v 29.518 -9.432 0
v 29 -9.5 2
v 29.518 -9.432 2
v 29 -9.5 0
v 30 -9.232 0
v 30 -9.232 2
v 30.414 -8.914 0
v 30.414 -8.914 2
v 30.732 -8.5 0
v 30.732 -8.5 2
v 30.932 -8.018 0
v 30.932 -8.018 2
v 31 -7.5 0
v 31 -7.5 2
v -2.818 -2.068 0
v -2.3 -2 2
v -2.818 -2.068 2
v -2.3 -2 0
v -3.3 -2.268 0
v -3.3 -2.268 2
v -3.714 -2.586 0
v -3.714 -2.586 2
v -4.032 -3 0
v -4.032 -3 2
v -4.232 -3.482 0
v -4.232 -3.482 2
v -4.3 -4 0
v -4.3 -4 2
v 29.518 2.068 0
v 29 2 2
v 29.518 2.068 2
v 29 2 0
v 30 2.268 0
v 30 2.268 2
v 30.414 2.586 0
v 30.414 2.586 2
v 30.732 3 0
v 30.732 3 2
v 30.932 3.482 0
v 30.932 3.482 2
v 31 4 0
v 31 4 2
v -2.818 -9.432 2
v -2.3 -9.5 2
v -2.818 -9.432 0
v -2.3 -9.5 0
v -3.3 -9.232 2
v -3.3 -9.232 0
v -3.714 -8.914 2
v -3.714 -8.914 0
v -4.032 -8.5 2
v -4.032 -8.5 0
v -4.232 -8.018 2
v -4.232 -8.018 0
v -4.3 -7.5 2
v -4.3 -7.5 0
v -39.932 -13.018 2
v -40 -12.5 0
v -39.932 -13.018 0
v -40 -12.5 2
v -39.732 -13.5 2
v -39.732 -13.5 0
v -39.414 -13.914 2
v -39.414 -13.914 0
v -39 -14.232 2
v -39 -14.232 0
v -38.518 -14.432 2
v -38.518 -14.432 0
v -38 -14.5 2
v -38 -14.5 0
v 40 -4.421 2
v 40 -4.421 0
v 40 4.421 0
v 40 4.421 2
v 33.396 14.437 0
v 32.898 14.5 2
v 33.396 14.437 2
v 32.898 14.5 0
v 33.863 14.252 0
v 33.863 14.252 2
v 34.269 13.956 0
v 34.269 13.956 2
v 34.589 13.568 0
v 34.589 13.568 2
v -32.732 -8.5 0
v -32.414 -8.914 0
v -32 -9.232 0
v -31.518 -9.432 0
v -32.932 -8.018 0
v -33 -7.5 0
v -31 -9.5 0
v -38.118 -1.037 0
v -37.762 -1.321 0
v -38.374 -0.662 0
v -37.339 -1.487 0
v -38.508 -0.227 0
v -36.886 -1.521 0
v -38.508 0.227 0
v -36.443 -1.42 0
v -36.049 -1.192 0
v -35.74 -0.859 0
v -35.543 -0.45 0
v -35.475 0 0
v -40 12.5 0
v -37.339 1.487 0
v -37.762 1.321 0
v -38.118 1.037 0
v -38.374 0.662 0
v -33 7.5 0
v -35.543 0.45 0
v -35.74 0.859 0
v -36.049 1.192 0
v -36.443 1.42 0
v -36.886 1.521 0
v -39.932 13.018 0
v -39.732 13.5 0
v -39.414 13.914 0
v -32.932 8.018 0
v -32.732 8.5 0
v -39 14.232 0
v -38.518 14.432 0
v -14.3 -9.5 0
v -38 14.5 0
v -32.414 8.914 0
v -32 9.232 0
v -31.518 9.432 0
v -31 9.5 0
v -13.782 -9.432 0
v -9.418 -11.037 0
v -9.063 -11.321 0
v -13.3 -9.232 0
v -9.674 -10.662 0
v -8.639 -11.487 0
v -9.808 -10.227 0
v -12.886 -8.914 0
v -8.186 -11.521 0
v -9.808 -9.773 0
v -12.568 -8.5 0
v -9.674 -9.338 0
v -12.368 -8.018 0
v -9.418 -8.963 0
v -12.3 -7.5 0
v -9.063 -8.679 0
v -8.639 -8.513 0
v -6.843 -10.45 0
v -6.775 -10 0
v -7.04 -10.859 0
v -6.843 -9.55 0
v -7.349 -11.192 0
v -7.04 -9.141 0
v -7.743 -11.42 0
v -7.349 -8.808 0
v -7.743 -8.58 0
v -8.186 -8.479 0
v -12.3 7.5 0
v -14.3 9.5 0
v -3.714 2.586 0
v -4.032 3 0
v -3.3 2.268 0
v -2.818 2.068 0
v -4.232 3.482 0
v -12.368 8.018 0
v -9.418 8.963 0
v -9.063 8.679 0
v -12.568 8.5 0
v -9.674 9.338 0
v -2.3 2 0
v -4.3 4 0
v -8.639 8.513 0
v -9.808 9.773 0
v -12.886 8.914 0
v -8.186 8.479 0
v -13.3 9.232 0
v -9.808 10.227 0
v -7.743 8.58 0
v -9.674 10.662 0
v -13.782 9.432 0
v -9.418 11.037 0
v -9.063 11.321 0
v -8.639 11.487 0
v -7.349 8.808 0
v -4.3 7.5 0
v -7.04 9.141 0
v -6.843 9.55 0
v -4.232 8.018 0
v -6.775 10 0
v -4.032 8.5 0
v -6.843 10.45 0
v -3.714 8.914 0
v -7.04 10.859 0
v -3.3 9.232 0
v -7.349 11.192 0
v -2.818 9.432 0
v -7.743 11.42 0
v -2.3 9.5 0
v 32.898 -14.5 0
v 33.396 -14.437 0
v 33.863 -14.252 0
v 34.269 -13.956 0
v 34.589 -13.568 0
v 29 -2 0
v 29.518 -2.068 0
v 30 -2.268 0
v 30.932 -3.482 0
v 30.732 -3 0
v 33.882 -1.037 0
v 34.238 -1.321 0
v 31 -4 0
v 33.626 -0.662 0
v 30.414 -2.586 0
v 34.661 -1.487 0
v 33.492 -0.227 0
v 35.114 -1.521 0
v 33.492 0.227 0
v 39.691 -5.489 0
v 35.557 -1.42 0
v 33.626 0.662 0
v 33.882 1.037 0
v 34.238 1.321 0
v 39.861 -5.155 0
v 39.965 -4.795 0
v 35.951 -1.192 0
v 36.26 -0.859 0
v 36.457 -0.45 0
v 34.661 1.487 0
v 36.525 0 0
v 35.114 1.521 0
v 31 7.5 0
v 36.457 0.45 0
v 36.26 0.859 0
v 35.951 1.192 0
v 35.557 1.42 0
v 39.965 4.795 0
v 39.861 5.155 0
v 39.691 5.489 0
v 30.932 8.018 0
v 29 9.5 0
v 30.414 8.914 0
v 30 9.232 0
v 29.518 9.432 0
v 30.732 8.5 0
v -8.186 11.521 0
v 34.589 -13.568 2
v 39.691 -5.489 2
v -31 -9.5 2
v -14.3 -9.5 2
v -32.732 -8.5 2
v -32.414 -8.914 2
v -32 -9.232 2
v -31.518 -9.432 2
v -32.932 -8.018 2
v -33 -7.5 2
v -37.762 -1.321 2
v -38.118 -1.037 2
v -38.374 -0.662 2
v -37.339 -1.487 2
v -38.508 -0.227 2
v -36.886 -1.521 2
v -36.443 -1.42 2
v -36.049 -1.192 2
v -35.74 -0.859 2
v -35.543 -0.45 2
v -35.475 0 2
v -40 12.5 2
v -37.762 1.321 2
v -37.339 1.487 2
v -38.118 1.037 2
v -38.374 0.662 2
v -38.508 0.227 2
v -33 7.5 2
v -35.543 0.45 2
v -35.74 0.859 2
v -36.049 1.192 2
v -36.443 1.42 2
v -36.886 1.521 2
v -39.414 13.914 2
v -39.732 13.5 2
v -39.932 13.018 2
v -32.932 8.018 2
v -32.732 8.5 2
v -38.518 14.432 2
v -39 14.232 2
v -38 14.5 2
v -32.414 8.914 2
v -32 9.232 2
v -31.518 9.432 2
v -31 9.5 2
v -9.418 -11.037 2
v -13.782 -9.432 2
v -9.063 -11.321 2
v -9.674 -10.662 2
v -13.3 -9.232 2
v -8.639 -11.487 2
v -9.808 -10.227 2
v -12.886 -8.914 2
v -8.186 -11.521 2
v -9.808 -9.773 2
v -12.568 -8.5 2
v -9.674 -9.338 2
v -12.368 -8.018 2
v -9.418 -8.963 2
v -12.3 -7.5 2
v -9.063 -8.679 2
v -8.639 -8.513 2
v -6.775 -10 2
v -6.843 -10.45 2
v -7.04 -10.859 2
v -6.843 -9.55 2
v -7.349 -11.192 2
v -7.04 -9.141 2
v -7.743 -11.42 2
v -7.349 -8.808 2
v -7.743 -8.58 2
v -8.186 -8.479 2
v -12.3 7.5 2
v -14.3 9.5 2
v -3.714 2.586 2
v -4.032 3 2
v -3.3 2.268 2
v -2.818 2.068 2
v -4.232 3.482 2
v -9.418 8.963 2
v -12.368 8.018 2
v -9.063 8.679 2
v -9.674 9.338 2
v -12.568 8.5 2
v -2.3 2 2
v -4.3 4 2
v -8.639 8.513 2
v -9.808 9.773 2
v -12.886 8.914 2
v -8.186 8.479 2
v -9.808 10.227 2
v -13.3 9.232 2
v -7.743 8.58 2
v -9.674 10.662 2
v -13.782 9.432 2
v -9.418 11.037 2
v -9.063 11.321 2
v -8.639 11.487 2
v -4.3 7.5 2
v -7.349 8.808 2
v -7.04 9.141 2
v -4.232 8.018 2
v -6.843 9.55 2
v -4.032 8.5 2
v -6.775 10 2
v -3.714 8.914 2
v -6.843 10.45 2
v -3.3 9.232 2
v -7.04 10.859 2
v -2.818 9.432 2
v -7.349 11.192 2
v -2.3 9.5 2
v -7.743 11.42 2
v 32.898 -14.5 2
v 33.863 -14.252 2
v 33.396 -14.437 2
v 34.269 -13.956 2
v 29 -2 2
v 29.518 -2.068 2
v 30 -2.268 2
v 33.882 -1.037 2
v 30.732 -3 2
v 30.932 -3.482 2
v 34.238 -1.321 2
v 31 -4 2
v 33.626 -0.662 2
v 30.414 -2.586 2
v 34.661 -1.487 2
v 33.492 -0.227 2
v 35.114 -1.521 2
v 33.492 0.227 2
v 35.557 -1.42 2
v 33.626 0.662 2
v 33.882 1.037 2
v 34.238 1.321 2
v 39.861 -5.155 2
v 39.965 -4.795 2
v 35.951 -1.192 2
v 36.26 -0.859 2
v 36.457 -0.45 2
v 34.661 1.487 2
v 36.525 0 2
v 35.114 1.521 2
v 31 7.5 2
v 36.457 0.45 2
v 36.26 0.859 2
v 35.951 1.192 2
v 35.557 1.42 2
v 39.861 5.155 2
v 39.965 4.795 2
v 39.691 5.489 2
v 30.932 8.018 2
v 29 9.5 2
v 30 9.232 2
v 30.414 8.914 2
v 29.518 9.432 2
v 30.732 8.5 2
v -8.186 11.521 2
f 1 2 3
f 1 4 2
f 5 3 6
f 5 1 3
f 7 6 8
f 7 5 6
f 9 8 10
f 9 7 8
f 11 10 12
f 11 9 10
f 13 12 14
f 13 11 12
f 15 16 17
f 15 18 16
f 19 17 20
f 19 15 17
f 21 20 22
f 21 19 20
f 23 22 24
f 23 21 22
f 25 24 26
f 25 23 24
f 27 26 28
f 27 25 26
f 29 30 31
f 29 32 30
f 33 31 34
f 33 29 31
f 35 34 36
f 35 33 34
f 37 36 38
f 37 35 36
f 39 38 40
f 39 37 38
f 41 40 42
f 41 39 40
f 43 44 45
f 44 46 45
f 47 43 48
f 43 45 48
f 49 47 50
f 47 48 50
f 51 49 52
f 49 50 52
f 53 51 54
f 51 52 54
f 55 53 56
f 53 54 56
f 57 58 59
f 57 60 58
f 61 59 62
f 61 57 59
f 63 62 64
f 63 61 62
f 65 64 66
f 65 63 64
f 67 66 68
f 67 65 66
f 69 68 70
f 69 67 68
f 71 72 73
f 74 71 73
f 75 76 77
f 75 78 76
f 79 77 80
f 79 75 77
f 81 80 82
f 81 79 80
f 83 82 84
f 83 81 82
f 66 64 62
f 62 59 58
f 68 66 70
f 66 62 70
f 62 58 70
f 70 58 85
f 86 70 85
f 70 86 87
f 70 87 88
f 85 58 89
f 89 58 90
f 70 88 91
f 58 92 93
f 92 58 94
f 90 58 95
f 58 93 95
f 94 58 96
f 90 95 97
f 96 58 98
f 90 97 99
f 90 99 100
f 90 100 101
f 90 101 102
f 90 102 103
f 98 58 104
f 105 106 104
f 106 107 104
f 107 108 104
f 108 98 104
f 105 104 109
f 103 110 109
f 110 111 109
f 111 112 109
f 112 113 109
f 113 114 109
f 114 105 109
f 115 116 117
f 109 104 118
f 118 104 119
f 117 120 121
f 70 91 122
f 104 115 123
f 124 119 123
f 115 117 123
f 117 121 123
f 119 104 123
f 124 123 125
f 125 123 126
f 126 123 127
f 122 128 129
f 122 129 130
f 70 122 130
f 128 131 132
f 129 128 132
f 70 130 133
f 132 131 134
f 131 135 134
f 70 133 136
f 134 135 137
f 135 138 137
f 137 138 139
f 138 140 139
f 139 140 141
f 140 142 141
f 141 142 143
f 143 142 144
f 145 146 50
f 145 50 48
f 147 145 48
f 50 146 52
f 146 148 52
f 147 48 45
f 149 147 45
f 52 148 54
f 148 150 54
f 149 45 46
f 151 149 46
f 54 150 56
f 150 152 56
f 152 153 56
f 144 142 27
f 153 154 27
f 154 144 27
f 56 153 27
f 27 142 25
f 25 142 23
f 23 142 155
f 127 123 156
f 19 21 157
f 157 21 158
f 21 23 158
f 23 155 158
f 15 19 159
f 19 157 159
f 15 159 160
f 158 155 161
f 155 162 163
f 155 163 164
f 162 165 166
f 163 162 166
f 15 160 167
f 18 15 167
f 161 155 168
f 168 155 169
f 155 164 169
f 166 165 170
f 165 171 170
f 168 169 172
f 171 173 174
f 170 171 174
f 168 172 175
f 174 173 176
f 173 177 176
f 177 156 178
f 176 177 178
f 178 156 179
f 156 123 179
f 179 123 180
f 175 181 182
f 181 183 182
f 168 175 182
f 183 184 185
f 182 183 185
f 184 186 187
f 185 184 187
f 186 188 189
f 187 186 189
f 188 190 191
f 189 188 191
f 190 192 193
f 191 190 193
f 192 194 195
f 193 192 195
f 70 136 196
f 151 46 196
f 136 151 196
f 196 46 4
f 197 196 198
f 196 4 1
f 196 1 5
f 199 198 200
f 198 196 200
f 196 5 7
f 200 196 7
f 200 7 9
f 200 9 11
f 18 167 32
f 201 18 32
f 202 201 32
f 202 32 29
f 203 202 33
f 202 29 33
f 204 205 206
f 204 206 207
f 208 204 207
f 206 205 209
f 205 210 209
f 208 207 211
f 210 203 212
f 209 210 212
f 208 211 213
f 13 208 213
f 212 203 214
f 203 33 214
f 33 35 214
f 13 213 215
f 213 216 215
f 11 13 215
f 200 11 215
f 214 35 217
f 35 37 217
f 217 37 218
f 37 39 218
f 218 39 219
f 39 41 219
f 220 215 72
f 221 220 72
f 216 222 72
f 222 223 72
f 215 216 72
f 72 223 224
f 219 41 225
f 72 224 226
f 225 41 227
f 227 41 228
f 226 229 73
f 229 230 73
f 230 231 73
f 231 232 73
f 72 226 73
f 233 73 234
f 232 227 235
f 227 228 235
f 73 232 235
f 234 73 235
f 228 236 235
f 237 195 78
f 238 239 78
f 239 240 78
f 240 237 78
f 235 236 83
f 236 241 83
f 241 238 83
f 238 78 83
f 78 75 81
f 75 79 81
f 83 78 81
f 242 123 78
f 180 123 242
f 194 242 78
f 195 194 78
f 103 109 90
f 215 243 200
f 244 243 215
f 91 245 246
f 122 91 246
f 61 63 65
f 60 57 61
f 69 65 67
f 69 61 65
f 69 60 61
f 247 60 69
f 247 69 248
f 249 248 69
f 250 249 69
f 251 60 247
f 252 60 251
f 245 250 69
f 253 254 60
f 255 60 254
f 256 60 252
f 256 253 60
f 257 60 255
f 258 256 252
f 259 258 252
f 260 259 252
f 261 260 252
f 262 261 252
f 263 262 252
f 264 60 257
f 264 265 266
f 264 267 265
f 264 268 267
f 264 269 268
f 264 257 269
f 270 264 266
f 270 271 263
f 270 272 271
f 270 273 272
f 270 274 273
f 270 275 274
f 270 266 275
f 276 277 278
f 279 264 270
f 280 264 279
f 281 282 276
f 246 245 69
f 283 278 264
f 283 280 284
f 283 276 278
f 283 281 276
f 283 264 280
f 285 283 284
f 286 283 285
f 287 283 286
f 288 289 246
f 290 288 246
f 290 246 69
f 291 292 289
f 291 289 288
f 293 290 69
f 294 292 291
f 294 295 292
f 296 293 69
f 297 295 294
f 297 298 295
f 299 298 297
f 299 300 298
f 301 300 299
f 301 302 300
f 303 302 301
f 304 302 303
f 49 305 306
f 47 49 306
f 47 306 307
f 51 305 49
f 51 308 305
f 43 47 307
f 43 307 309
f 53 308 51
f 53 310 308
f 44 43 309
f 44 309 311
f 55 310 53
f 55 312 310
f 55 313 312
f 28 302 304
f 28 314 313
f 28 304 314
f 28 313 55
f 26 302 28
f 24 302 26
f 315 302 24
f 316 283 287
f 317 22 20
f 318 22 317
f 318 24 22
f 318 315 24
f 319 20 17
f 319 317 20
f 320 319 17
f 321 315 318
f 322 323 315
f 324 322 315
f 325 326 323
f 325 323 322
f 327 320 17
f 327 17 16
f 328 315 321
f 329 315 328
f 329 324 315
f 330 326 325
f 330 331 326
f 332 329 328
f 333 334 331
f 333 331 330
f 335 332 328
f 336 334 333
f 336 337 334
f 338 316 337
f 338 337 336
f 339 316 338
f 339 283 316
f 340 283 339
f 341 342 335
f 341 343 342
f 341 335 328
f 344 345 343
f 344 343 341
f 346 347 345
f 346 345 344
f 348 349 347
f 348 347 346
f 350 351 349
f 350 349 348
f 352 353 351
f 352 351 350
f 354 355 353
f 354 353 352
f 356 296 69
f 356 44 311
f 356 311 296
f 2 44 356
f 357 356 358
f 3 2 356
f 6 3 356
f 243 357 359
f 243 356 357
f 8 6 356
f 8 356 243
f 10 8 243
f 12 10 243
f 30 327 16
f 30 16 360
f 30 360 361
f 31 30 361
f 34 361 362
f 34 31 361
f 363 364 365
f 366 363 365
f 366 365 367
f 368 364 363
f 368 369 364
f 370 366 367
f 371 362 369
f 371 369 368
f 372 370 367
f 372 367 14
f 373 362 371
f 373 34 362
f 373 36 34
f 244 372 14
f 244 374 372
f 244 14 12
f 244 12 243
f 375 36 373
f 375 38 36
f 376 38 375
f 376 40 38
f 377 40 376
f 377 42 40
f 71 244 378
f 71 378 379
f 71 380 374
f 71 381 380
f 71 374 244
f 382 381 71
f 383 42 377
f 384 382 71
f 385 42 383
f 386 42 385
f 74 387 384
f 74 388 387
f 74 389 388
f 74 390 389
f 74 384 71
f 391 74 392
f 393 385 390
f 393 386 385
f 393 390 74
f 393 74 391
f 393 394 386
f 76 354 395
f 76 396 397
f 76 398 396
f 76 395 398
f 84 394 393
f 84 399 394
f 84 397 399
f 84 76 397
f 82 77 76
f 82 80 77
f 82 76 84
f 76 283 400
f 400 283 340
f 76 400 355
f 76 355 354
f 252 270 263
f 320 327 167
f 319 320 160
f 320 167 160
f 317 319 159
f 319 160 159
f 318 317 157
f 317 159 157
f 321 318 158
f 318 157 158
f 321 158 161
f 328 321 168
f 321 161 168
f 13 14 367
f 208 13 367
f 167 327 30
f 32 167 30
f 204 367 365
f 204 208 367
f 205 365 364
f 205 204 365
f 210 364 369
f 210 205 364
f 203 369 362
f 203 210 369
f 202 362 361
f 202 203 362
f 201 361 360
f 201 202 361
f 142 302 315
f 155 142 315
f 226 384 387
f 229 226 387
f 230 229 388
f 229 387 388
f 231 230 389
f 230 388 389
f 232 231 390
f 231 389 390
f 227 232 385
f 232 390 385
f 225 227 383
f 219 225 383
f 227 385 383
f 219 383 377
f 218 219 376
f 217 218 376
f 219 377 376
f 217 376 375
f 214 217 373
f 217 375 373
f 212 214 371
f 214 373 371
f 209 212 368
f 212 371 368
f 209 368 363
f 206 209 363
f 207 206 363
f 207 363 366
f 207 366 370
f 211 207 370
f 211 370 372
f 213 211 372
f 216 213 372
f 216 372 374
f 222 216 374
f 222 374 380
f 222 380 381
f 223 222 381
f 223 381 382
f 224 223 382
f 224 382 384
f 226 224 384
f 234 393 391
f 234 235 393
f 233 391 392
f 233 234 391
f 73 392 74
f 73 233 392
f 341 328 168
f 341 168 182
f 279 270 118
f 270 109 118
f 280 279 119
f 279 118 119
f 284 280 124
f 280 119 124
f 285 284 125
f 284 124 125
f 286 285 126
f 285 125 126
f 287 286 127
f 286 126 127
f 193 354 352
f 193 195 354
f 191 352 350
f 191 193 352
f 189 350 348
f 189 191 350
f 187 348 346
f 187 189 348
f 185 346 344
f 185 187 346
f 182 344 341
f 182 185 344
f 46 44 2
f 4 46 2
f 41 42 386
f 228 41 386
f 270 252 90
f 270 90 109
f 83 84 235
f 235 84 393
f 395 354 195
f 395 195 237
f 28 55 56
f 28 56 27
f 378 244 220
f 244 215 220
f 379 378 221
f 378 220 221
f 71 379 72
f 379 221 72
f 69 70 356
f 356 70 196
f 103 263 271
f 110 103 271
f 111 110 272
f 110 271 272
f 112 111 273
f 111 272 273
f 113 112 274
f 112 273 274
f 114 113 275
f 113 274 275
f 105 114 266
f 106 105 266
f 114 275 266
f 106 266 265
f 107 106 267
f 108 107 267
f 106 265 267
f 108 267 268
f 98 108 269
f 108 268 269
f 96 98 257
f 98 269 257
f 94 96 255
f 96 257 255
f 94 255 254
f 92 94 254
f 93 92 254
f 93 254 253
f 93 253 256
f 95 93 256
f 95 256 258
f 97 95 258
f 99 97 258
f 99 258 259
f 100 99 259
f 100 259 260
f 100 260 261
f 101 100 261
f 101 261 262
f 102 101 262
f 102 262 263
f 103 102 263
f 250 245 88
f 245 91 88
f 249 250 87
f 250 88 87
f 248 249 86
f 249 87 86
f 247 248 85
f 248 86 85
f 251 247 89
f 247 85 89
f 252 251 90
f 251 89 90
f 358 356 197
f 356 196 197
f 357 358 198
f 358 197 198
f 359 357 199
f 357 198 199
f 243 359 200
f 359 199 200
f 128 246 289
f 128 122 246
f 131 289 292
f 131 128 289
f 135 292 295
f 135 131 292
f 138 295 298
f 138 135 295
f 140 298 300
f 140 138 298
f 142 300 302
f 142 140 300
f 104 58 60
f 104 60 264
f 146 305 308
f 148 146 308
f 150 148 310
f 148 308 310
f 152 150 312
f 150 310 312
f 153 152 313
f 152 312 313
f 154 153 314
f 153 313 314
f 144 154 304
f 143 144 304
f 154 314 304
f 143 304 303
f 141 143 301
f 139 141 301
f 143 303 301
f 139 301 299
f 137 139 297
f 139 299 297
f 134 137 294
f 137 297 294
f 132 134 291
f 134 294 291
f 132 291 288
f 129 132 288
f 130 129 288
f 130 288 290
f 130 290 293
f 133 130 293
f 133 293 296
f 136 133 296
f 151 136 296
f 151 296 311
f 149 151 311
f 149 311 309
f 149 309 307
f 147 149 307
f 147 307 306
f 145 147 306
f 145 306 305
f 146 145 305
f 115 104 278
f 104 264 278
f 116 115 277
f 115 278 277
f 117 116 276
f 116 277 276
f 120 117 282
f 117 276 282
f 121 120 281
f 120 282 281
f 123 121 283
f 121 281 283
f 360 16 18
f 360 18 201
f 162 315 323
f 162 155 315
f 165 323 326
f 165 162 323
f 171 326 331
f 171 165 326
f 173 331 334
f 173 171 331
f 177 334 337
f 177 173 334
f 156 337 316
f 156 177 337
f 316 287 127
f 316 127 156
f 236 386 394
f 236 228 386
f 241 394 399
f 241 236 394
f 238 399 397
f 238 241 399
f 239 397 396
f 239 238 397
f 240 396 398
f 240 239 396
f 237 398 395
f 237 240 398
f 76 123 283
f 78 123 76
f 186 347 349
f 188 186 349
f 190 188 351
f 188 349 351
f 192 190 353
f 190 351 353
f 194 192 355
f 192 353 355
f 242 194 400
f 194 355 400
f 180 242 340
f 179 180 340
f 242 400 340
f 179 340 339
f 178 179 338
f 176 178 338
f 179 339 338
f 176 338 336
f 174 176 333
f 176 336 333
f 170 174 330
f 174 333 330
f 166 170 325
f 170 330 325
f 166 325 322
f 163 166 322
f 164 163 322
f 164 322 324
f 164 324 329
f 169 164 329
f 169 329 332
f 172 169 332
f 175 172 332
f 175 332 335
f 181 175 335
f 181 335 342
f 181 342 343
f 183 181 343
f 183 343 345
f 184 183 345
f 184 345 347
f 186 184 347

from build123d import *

# Parameters (mm, degrees)
SKETCH_1_W          = 80
SKETCH_1_H          = 29
EXTRUDE_1_DEPTH     = 2
CUT_EXTRUDE_1_DEPTH = 2
SKETCH_3_R          = 1.525
CUT_EXTRUDE_2_DEPTH = 10
SKETCH_4_R          = 1.525
CUT_EXTRUDE_3_DEPTH = 10
FILLET_1_R          = 2
SKETCH_5_W          = 20.7
SKETCH_5_H          = 19
CUT_EXTRUDE_4_DEPTH = 10
SKETCH_6_W          = 35.3
SKETCH_6_H          = 7.5
CUT_EXTRUDE_5_DEPTH = 10
FILLET_2_R          = 2


with BuildPart() as part:
    # 草图1 → 凸台-拉伸1 (new body)
    with BuildSketch(Plane.XY):
        Rectangle(SKETCH_1_W, SKETCH_1_H)
    extrude(amount=EXTRUDE_1_DEPTH)

    # 草图2 → 切除-拉伸1 (cut)
    with BuildSketch(Plane.XY.offset(2)):
        Polygon((34, 14.5), (40, 5), (40, 14.5), align=None)
        Polygon((40, -14.5), (34, -14.5), (40, -5), align=None)
    extrude(amount=-CUT_EXTRUDE_1_DEPTH, mode=Mode.SUBTRACT)

    # 草图3 → 切除-拉伸2 (cut)
    with BuildSketch(Plane.XY.offset(2)):
        with Locations((-8.3, 10)):
            Circle(SKETCH_3_R)
        with Locations((-37, 0)):
            Circle(SKETCH_3_R)
        with Locations((-8.3, -10)):
            Circle(SKETCH_3_R)
    extrude(amount=-CUT_EXTRUDE_2_DEPTH, mode=Mode.SUBTRACT)

    # 草图4 → 切除-拉伸3 (cut)
    with BuildSketch(Plane.XY.offset(2)):
        with Locations((35, 0)):
            Circle(SKETCH_4_R)
    extrude(amount=-CUT_EXTRUDE_3_DEPTH, mode=Mode.SUBTRACT)

    # 圆角1
    fillet_1_edges = [part.edges().sort_by_distance(p)[0] for p in [
        (34, 14.5, 1),
        (40, 5, 1),
        (40, -5, 1),
        (34, -14.5, 1),
        (-40, -14.5, 1),
        (-40, 14.5, 1),
    ]]
    fillet(fillet_1_edges, radius=FILLET_1_R)

    # 草图5 → 切除-拉伸4 (cut)
    with BuildSketch(Plane.XY.offset(2)):
        with Locations((-22.65, 0)):
            Rectangle(SKETCH_5_W, SKETCH_5_H)
    extrude(amount=-CUT_EXTRUDE_4_DEPTH, mode=Mode.SUBTRACT)

    # 草图6 → 切除-拉伸5 (cut)
    with BuildSketch(Plane.XY.offset(2)):
        with Locations((13.35, 5.75)):
            Rectangle(SKETCH_6_W, SKETCH_6_H)
        with Locations((13.35, -5.75)):
            Rectangle(SKETCH_6_W, SKETCH_6_H)
    extrude(amount=-CUT_EXTRUDE_5_DEPTH, mode=Mode.SUBTRACT)

    # 圆角2
    fillet_2_edges = [part.edges().sort_by_distance(p)[0] for p in [
        (-33, 9.5, 1),
        (-12.3, 9.5, 1),
        (-12.3, -9.5, 1),
        (-33, -9.5, 1),
        (-4.3, 2, 1),
        (-4.3, 9.5, 1),
        (31, 9.5, 1),
        (31, 2, 1),
        (-4.3, -2, 1),
        (31, -2, 1),
        (31, -9.5, 1),
        (-4.3, -9.5, 1),
    ]]
    fillet(fillet_2_edges, radius=FILLET_2_R)


solid = part.part
